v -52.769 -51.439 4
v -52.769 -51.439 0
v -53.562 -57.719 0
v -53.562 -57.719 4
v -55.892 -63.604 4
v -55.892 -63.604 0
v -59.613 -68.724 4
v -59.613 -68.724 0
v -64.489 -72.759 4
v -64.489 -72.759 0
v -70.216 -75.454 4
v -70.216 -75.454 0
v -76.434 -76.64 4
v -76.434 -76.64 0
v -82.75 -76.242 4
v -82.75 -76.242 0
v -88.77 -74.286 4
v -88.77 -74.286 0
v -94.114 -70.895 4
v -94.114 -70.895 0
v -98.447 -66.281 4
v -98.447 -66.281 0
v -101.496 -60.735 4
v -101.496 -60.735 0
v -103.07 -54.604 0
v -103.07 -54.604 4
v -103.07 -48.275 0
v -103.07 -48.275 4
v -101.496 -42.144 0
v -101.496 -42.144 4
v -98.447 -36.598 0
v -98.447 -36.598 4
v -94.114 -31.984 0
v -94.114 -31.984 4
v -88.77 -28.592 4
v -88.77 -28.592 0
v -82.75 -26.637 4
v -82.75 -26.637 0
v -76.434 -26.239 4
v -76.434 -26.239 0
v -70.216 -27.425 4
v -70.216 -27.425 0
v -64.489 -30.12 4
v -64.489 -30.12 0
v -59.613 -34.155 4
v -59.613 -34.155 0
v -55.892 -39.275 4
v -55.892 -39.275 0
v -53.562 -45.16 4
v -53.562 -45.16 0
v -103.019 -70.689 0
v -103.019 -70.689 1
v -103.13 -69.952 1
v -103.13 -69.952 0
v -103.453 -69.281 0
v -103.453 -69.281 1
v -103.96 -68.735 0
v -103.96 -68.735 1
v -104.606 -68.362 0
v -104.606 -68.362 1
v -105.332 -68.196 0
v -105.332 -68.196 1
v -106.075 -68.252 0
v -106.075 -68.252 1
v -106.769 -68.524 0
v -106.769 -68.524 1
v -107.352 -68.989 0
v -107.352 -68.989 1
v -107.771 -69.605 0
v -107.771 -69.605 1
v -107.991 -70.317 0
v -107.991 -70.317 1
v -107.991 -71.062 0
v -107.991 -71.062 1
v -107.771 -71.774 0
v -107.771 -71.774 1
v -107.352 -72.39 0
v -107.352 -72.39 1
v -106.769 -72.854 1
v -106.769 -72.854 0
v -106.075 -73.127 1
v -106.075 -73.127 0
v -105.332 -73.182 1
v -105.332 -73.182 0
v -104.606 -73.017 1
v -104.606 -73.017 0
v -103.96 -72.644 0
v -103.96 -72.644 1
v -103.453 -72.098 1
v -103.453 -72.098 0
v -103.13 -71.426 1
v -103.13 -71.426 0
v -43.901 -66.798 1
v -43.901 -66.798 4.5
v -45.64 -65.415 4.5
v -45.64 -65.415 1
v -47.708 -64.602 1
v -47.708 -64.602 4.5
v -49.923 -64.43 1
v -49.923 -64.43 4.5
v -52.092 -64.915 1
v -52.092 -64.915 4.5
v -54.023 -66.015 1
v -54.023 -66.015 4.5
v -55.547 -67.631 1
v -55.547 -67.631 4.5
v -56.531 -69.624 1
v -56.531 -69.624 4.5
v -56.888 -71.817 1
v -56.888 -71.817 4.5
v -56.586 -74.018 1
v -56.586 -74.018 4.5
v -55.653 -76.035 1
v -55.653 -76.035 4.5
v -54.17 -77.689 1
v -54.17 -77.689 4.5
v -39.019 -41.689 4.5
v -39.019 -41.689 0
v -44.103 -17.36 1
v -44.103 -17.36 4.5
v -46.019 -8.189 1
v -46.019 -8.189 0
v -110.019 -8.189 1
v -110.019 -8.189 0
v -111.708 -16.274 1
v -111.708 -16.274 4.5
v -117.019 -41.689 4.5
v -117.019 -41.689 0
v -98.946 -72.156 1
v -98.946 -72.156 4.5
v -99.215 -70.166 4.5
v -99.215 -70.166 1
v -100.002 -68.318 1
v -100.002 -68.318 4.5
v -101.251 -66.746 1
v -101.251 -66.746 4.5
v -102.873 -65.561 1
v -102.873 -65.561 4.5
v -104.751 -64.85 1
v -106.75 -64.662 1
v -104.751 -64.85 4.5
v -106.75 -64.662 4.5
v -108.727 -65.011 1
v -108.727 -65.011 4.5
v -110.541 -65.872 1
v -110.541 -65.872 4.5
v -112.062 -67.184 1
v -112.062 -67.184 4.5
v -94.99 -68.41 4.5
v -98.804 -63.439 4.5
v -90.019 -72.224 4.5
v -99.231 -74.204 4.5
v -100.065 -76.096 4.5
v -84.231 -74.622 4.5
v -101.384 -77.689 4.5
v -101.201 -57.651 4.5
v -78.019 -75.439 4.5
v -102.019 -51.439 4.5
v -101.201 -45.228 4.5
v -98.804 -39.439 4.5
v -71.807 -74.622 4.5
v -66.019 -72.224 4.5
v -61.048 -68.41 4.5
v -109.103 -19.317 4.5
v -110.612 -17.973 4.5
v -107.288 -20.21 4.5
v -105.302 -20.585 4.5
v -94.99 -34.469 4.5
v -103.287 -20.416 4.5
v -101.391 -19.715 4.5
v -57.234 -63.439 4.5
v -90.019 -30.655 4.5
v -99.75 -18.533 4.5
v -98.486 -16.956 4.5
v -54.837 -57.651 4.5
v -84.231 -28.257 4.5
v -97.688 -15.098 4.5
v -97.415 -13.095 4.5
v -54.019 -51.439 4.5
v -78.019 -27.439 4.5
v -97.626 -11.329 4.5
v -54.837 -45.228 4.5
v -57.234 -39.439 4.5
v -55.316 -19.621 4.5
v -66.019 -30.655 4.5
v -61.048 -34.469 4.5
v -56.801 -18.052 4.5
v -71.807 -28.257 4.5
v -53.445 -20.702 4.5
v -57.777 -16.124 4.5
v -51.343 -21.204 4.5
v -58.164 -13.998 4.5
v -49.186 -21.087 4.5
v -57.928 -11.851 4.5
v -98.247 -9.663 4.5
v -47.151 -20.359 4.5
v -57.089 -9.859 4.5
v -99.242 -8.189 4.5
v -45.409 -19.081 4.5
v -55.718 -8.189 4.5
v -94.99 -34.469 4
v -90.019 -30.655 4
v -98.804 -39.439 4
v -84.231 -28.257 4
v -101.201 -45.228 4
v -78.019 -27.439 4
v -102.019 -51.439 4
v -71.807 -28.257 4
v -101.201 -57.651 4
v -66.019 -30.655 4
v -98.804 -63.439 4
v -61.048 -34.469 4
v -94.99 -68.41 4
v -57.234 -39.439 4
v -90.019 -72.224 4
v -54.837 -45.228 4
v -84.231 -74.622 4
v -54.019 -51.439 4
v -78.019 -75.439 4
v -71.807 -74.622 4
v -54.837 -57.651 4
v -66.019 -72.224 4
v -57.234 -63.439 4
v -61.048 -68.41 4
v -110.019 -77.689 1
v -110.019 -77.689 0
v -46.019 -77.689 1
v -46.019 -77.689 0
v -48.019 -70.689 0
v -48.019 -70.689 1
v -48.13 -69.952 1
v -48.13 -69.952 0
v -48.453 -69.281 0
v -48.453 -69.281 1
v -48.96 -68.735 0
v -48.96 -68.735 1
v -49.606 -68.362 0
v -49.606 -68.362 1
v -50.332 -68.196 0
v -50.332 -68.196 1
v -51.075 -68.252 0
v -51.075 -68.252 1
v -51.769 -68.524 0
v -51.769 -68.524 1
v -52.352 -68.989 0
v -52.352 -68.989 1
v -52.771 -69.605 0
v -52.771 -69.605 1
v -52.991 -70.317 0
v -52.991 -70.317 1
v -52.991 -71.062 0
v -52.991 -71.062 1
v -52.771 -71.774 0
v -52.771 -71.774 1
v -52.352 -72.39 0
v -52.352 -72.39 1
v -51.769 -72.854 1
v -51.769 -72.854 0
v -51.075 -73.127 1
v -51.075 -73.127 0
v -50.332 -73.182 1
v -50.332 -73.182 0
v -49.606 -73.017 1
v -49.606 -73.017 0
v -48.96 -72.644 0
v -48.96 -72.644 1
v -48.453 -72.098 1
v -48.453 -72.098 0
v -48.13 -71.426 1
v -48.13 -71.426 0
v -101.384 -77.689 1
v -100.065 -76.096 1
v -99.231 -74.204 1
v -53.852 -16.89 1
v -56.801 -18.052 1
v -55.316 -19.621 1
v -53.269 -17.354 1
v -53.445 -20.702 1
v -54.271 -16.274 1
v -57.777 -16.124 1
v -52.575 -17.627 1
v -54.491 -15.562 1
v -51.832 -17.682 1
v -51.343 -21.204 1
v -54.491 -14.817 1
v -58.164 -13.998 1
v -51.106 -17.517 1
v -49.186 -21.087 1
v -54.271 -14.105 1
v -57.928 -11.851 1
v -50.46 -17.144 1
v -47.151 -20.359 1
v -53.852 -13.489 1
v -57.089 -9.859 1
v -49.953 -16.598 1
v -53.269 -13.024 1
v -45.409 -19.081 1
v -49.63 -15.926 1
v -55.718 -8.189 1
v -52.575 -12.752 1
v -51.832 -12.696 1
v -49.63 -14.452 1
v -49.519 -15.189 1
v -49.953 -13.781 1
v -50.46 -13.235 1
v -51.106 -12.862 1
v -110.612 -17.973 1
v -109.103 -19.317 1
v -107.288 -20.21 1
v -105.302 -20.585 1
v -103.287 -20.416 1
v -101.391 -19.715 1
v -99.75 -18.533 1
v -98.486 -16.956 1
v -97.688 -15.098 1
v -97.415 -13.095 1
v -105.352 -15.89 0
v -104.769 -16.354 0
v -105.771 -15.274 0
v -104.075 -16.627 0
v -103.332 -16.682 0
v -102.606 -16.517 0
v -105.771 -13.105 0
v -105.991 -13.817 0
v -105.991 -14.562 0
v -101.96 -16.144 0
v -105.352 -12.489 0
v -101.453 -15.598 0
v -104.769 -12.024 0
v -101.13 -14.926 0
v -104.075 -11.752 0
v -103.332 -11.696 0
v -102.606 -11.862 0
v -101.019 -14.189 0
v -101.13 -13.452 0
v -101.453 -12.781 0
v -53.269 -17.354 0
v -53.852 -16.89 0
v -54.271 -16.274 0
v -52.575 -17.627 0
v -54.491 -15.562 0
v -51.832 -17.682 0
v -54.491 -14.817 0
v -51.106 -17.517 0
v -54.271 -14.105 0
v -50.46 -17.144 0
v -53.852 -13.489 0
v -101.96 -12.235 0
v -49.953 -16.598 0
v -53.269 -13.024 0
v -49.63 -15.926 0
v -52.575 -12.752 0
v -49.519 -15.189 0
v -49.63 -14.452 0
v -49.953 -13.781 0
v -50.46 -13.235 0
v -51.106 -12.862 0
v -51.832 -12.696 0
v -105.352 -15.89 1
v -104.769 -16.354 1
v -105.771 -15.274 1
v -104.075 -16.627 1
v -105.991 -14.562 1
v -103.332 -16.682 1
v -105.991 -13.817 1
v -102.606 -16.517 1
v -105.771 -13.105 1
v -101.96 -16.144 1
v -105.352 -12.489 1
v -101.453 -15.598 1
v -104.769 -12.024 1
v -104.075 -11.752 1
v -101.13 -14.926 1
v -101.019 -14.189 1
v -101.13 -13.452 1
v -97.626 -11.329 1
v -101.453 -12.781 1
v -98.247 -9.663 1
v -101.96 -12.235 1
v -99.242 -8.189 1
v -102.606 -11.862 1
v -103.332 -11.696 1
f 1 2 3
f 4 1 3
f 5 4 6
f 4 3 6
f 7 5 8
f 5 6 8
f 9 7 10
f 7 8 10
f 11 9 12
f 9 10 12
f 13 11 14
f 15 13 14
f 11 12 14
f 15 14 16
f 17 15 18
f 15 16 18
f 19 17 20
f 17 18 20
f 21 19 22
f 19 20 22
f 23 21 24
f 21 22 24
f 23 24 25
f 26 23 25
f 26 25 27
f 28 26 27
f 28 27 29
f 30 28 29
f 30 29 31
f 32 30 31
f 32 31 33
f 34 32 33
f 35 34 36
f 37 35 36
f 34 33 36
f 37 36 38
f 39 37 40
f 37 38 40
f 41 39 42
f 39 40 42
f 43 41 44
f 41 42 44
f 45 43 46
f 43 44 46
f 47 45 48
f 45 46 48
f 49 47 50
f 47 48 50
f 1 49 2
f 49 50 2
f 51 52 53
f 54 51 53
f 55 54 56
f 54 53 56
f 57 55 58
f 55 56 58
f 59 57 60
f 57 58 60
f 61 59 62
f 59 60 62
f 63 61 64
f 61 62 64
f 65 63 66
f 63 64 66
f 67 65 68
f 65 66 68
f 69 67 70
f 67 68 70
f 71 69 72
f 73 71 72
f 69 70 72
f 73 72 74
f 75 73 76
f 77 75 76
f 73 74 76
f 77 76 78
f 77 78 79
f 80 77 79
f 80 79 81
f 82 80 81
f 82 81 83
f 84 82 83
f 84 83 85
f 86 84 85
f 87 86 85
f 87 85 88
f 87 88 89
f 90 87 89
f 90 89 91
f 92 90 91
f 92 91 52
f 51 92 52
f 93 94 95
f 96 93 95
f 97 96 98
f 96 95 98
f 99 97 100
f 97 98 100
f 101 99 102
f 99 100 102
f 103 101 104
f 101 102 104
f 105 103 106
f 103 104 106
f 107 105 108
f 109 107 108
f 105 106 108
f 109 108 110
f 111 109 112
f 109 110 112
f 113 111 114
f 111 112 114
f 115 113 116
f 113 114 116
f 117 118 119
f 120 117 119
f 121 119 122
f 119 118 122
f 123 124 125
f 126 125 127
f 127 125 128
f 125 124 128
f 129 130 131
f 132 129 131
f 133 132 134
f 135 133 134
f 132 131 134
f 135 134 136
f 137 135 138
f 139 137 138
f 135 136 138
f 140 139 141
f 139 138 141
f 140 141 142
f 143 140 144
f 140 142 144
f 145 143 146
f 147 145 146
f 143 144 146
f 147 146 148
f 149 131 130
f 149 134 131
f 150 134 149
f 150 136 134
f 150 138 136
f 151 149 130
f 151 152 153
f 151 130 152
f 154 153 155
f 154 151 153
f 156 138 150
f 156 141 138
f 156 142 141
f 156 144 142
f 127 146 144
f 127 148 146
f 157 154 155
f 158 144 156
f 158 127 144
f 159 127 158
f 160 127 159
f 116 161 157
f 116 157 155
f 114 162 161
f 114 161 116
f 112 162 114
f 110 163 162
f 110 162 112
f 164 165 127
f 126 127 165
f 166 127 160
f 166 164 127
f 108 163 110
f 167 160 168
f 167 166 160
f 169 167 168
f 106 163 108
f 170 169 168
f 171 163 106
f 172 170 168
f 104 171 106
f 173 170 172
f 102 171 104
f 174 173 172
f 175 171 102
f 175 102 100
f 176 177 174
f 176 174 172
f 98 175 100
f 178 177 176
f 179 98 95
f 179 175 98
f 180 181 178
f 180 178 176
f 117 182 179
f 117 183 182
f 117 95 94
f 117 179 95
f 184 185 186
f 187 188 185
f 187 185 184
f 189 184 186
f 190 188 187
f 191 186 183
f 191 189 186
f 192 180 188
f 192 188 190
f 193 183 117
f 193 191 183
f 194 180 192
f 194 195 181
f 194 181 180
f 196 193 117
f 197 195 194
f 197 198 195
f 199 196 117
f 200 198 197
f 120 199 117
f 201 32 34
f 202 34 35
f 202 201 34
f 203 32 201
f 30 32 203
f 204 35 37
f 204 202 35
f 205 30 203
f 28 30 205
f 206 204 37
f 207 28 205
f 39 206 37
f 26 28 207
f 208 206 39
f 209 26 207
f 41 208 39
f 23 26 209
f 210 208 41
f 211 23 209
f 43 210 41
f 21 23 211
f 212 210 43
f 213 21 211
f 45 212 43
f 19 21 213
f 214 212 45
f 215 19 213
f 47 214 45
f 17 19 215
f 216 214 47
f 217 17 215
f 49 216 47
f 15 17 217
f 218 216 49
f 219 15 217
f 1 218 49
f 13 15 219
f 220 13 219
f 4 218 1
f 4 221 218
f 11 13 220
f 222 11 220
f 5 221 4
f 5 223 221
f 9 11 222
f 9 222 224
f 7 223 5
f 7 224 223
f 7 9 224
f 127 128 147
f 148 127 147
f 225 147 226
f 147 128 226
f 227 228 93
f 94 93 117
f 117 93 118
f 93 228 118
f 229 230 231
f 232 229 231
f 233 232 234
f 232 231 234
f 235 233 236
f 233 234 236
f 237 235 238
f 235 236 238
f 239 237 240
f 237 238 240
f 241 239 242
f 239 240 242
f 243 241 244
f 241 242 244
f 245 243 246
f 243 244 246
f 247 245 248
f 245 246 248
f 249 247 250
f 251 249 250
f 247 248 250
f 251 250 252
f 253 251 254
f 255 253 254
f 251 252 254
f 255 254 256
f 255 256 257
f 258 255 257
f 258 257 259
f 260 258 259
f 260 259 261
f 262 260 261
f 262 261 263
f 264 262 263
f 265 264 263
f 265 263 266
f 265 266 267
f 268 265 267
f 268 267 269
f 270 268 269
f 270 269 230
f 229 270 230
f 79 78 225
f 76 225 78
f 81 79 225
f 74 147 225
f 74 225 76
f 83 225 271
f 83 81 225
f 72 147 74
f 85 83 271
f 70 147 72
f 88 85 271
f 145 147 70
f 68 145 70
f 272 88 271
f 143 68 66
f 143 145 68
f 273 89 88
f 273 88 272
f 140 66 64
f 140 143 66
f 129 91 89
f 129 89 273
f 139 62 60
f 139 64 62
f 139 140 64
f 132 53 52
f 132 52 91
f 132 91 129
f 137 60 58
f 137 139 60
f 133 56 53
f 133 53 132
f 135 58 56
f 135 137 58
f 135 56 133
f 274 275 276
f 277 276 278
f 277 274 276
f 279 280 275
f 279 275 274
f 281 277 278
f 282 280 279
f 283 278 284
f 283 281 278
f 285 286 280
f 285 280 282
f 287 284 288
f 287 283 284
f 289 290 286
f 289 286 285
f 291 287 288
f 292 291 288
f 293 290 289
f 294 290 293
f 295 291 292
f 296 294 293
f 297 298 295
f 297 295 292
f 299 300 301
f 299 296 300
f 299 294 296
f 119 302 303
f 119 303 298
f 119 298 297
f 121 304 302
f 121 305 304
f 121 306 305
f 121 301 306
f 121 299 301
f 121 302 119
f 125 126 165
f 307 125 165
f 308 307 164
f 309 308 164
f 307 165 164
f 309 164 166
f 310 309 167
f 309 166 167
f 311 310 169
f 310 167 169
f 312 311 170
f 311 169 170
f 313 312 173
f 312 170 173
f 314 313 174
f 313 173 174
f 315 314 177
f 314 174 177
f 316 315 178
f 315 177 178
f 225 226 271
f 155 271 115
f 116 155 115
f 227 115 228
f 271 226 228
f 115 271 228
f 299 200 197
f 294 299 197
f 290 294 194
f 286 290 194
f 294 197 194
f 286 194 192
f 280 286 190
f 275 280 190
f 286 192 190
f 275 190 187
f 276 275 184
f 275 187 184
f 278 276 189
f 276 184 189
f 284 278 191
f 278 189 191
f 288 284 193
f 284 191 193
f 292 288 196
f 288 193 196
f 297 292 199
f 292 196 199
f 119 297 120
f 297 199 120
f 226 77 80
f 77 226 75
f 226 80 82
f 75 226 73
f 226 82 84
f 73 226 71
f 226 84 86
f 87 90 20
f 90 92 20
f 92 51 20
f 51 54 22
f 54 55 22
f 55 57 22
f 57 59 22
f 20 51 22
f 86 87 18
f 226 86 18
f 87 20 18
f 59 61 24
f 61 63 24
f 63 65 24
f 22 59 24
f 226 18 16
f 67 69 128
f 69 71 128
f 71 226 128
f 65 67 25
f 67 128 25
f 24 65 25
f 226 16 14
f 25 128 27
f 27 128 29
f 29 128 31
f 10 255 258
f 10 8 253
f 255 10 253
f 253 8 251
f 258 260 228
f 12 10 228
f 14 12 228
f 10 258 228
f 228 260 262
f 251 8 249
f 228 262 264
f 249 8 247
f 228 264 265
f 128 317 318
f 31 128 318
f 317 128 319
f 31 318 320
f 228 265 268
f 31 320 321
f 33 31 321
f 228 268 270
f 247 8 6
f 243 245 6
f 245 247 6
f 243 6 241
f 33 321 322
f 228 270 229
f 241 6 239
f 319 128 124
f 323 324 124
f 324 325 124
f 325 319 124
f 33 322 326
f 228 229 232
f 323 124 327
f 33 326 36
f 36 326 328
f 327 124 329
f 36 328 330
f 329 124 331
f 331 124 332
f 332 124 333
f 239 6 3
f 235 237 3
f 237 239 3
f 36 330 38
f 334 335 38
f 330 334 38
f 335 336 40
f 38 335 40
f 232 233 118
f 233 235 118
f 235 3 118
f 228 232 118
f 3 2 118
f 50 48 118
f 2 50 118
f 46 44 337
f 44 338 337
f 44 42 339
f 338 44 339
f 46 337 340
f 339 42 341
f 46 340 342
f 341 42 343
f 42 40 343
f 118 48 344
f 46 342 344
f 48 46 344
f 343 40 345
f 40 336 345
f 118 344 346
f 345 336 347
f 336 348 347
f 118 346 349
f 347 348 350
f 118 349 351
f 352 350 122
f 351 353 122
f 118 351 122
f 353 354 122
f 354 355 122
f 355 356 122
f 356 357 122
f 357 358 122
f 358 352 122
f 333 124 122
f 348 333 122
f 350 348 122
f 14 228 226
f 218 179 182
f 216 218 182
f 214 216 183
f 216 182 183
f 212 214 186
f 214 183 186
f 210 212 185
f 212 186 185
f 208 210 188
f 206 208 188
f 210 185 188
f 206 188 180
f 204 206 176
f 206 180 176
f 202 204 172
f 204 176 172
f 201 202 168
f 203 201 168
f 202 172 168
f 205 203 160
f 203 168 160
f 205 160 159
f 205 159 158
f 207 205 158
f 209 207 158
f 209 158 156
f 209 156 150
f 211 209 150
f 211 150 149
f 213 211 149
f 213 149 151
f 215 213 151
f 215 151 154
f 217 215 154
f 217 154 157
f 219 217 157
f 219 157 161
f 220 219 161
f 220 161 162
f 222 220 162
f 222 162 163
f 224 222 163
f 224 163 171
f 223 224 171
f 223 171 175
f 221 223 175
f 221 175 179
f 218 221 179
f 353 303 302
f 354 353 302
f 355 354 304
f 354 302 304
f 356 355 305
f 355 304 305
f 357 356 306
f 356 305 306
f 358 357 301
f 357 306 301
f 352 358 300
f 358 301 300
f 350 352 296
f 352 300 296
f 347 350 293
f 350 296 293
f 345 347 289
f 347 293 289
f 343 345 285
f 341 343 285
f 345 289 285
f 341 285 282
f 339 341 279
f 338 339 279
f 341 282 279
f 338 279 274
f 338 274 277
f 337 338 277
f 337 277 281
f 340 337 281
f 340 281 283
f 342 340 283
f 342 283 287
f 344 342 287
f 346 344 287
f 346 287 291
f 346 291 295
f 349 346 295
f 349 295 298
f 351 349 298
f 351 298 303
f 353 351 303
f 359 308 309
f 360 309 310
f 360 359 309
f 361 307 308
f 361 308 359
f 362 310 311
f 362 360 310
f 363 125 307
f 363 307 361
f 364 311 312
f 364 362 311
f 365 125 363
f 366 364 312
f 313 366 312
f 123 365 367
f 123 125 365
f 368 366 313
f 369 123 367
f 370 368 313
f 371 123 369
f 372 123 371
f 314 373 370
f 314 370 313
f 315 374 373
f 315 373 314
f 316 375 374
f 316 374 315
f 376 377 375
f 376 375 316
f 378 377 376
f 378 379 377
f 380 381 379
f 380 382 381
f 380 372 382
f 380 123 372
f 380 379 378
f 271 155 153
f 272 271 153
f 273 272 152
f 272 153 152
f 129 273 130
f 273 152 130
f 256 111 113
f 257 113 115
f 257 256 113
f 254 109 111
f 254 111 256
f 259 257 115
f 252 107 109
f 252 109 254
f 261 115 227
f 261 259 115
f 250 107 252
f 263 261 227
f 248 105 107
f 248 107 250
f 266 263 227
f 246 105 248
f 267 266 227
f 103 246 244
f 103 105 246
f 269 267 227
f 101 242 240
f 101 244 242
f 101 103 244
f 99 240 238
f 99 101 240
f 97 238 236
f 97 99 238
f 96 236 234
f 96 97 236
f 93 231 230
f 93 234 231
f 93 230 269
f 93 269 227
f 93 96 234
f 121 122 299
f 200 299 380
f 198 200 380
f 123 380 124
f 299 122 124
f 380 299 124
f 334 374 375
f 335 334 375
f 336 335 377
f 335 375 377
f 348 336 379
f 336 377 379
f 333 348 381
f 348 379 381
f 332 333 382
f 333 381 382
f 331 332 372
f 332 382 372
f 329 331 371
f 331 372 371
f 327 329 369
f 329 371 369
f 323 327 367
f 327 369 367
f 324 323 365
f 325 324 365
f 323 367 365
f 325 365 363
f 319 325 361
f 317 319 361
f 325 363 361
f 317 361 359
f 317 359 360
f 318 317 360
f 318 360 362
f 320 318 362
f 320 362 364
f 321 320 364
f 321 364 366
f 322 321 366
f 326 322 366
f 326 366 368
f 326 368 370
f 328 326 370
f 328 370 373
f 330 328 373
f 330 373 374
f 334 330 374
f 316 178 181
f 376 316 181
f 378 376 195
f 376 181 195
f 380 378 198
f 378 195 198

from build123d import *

# Parameters (mm, degrees)
F1_DEPTH = 4.5
F2_R     = 11
F2_R_2   = 24
F3_DEPTH = 50
F2_R_3   = 2.5
F4_DEPTH = 25
F5_DEPTH = 3.5
F6_DEPTH = 2
F7_R     = 25.25
F8_DEPTH = 4


# Not quite as in the source:
# - a feature names something its author has since deleted; it is built from what else it names


with BuildPart() as f1:
    # F0 (on Top) → F1 (new body)
    with BuildSketch(Plane.XY):
        Polygon((-46.0190125704, -8.1893682778), (-110.0190125704, -8.1893682778), (-117.0190125704, -41.6893682778), (-110.0190125704, -77.6893682778), (-46.0190125704, -77.6893682778), (-39.0190125704, -41.6893682778), align=None)
    extrude(amount=F1_DEPTH)

    # F2 (on face) → F3 (cut)
    with BuildSketch(Plane.XY.offset(4.5)):
        with Locations((36.7125935962, -5.1025906342)):
            Circle(F2_R)
        with Locations((63.6127434798, -2.782690585)):
            Circle(F2_R)
        with Locations((-78.0190125704, -51.4393682778)):
            Circle(F2_R_2)
    extrude(amount=-F3_DEPTH, mode=Mode.SUBTRACT)

    # F2 (on face) → F4 (cut)
    with BuildSketch(Plane.XY.offset(4.5)):
        with Locations((-103.5190125704, -14.1893682778)):
            Circle(F2_R_3)
        with Locations((-52.0190125704, -15.1893682778)):
            Circle(F2_R_3)
        with Locations((-105.5190125704, -70.6893682778)):
            Circle(F2_R_3)
        with Locations((-50.5190125704, -70.6893682778)):
            Circle(F2_R_3)
    extrude(amount=-F4_DEPTH, mode=Mode.SUBTRACT)

    # F2 (on face) → F5 (cut)
    with BuildSketch(Plane.XY.offset(4.5)):
        with BuildLine():
            Line((-110.0190125704, -8.1893682778), (-111.7083286904, -16.2739525667))
            ThreePointArc((-111.7083286904, -16.2739525667), (-103.2870621366, -20.4161997132), (-97.4153326836, -13.0950840178))
            ThreePointArc((-97.4153326836, -13.0950840178), (-97.8868841728, -10.4776594188), (-99.2422424253, -8.1893682778))
            Line((-99.2422424253, -8.1893682778), (-110.0190125704, -8.1893682778))
        make_face()
        with Locations((-103.5190125704, -14.1893682778)):
            Circle(F2_R_3, mode=Mode.SUBTRACT)
        with BuildLine():
            Line((-46.0190125704, -8.1893682778), (-55.7181574473, -8.1893682778))
            ThreePointArc((-55.7181574473, -8.1893682778), (-55.3158791173, -19.6211139555), (-44.1027782894, -17.3599180513))
            Line((-44.1027782894, -17.3599180513), (-46.0190125704, -8.1893682778))
        make_face()
        with Locations((-52.0190125704, -15.1893682778)):
            Circle(F2_R_3, mode=Mode.SUBTRACT)
        with BuildLine():
            ThreePointArc((-101.3837870838, -77.6893682778), (-99.5825379735, -75.1790324483), (-98.9461190179, -72.1555815644))
            ThreePointArc((-98.9461190179, -72.1555815644), (-103.7878144934, -65.1424925834), (-112.0616968993, -67.1841345861))
            Line((-112.0616968993, -67.1841345861), (-110.0190125704, -77.6893682778))
            Line((-110.0190125704, -77.6893682778), (-101.3837870838, -77.6893682778))
        make_face()
        with Locations((-105.5190125704, -70.6893682778)):
            Circle(F2_R_3, mode=Mode.SUBTRACT)
        with BuildLine():
            ThreePointArc((-43.9012732129, -66.7981372962), (-54.8452929266, -66.7661737817), (-54.1697108353, -77.6893682778))
            Line((-54.1697108353, -77.6893682778), (-46.0190125704, -77.6893682778))
            Line((-46.0190125704, -77.6893682778), (-43.9012732129, -66.7981372962))
        make_face()
        with Locations((-50.5190125704, -70.6893682778)):
            Circle(F2_R_3, mode=Mode.SUBTRACT)
    extrude(amount=-F5_DEPTH, mode=Mode.SUBTRACT)

    # F2 (on face) → F6 (cut)
    with BuildSketch(Plane.XY.offset(4.5)):
        with Locations((-78.0190125704, -51.4393682778)):
            Circle(F2_R_2)
    extrude(amount=-F6_DEPTH, mode=Mode.SUBTRACT)

    # F7 (on face) → F8 (cut)
    with BuildSketch(Plane(origin=(0, 0, 0), x_dir=(1, 0, 0), z_dir=(0, 0, -1))):
        with Locations((-78.0190125704, 51.4393682778)):
            Circle(F7_R)
    extrude(amount=-F8_DEPTH, mode=Mode.SUBTRACT)


solid = f1.part
